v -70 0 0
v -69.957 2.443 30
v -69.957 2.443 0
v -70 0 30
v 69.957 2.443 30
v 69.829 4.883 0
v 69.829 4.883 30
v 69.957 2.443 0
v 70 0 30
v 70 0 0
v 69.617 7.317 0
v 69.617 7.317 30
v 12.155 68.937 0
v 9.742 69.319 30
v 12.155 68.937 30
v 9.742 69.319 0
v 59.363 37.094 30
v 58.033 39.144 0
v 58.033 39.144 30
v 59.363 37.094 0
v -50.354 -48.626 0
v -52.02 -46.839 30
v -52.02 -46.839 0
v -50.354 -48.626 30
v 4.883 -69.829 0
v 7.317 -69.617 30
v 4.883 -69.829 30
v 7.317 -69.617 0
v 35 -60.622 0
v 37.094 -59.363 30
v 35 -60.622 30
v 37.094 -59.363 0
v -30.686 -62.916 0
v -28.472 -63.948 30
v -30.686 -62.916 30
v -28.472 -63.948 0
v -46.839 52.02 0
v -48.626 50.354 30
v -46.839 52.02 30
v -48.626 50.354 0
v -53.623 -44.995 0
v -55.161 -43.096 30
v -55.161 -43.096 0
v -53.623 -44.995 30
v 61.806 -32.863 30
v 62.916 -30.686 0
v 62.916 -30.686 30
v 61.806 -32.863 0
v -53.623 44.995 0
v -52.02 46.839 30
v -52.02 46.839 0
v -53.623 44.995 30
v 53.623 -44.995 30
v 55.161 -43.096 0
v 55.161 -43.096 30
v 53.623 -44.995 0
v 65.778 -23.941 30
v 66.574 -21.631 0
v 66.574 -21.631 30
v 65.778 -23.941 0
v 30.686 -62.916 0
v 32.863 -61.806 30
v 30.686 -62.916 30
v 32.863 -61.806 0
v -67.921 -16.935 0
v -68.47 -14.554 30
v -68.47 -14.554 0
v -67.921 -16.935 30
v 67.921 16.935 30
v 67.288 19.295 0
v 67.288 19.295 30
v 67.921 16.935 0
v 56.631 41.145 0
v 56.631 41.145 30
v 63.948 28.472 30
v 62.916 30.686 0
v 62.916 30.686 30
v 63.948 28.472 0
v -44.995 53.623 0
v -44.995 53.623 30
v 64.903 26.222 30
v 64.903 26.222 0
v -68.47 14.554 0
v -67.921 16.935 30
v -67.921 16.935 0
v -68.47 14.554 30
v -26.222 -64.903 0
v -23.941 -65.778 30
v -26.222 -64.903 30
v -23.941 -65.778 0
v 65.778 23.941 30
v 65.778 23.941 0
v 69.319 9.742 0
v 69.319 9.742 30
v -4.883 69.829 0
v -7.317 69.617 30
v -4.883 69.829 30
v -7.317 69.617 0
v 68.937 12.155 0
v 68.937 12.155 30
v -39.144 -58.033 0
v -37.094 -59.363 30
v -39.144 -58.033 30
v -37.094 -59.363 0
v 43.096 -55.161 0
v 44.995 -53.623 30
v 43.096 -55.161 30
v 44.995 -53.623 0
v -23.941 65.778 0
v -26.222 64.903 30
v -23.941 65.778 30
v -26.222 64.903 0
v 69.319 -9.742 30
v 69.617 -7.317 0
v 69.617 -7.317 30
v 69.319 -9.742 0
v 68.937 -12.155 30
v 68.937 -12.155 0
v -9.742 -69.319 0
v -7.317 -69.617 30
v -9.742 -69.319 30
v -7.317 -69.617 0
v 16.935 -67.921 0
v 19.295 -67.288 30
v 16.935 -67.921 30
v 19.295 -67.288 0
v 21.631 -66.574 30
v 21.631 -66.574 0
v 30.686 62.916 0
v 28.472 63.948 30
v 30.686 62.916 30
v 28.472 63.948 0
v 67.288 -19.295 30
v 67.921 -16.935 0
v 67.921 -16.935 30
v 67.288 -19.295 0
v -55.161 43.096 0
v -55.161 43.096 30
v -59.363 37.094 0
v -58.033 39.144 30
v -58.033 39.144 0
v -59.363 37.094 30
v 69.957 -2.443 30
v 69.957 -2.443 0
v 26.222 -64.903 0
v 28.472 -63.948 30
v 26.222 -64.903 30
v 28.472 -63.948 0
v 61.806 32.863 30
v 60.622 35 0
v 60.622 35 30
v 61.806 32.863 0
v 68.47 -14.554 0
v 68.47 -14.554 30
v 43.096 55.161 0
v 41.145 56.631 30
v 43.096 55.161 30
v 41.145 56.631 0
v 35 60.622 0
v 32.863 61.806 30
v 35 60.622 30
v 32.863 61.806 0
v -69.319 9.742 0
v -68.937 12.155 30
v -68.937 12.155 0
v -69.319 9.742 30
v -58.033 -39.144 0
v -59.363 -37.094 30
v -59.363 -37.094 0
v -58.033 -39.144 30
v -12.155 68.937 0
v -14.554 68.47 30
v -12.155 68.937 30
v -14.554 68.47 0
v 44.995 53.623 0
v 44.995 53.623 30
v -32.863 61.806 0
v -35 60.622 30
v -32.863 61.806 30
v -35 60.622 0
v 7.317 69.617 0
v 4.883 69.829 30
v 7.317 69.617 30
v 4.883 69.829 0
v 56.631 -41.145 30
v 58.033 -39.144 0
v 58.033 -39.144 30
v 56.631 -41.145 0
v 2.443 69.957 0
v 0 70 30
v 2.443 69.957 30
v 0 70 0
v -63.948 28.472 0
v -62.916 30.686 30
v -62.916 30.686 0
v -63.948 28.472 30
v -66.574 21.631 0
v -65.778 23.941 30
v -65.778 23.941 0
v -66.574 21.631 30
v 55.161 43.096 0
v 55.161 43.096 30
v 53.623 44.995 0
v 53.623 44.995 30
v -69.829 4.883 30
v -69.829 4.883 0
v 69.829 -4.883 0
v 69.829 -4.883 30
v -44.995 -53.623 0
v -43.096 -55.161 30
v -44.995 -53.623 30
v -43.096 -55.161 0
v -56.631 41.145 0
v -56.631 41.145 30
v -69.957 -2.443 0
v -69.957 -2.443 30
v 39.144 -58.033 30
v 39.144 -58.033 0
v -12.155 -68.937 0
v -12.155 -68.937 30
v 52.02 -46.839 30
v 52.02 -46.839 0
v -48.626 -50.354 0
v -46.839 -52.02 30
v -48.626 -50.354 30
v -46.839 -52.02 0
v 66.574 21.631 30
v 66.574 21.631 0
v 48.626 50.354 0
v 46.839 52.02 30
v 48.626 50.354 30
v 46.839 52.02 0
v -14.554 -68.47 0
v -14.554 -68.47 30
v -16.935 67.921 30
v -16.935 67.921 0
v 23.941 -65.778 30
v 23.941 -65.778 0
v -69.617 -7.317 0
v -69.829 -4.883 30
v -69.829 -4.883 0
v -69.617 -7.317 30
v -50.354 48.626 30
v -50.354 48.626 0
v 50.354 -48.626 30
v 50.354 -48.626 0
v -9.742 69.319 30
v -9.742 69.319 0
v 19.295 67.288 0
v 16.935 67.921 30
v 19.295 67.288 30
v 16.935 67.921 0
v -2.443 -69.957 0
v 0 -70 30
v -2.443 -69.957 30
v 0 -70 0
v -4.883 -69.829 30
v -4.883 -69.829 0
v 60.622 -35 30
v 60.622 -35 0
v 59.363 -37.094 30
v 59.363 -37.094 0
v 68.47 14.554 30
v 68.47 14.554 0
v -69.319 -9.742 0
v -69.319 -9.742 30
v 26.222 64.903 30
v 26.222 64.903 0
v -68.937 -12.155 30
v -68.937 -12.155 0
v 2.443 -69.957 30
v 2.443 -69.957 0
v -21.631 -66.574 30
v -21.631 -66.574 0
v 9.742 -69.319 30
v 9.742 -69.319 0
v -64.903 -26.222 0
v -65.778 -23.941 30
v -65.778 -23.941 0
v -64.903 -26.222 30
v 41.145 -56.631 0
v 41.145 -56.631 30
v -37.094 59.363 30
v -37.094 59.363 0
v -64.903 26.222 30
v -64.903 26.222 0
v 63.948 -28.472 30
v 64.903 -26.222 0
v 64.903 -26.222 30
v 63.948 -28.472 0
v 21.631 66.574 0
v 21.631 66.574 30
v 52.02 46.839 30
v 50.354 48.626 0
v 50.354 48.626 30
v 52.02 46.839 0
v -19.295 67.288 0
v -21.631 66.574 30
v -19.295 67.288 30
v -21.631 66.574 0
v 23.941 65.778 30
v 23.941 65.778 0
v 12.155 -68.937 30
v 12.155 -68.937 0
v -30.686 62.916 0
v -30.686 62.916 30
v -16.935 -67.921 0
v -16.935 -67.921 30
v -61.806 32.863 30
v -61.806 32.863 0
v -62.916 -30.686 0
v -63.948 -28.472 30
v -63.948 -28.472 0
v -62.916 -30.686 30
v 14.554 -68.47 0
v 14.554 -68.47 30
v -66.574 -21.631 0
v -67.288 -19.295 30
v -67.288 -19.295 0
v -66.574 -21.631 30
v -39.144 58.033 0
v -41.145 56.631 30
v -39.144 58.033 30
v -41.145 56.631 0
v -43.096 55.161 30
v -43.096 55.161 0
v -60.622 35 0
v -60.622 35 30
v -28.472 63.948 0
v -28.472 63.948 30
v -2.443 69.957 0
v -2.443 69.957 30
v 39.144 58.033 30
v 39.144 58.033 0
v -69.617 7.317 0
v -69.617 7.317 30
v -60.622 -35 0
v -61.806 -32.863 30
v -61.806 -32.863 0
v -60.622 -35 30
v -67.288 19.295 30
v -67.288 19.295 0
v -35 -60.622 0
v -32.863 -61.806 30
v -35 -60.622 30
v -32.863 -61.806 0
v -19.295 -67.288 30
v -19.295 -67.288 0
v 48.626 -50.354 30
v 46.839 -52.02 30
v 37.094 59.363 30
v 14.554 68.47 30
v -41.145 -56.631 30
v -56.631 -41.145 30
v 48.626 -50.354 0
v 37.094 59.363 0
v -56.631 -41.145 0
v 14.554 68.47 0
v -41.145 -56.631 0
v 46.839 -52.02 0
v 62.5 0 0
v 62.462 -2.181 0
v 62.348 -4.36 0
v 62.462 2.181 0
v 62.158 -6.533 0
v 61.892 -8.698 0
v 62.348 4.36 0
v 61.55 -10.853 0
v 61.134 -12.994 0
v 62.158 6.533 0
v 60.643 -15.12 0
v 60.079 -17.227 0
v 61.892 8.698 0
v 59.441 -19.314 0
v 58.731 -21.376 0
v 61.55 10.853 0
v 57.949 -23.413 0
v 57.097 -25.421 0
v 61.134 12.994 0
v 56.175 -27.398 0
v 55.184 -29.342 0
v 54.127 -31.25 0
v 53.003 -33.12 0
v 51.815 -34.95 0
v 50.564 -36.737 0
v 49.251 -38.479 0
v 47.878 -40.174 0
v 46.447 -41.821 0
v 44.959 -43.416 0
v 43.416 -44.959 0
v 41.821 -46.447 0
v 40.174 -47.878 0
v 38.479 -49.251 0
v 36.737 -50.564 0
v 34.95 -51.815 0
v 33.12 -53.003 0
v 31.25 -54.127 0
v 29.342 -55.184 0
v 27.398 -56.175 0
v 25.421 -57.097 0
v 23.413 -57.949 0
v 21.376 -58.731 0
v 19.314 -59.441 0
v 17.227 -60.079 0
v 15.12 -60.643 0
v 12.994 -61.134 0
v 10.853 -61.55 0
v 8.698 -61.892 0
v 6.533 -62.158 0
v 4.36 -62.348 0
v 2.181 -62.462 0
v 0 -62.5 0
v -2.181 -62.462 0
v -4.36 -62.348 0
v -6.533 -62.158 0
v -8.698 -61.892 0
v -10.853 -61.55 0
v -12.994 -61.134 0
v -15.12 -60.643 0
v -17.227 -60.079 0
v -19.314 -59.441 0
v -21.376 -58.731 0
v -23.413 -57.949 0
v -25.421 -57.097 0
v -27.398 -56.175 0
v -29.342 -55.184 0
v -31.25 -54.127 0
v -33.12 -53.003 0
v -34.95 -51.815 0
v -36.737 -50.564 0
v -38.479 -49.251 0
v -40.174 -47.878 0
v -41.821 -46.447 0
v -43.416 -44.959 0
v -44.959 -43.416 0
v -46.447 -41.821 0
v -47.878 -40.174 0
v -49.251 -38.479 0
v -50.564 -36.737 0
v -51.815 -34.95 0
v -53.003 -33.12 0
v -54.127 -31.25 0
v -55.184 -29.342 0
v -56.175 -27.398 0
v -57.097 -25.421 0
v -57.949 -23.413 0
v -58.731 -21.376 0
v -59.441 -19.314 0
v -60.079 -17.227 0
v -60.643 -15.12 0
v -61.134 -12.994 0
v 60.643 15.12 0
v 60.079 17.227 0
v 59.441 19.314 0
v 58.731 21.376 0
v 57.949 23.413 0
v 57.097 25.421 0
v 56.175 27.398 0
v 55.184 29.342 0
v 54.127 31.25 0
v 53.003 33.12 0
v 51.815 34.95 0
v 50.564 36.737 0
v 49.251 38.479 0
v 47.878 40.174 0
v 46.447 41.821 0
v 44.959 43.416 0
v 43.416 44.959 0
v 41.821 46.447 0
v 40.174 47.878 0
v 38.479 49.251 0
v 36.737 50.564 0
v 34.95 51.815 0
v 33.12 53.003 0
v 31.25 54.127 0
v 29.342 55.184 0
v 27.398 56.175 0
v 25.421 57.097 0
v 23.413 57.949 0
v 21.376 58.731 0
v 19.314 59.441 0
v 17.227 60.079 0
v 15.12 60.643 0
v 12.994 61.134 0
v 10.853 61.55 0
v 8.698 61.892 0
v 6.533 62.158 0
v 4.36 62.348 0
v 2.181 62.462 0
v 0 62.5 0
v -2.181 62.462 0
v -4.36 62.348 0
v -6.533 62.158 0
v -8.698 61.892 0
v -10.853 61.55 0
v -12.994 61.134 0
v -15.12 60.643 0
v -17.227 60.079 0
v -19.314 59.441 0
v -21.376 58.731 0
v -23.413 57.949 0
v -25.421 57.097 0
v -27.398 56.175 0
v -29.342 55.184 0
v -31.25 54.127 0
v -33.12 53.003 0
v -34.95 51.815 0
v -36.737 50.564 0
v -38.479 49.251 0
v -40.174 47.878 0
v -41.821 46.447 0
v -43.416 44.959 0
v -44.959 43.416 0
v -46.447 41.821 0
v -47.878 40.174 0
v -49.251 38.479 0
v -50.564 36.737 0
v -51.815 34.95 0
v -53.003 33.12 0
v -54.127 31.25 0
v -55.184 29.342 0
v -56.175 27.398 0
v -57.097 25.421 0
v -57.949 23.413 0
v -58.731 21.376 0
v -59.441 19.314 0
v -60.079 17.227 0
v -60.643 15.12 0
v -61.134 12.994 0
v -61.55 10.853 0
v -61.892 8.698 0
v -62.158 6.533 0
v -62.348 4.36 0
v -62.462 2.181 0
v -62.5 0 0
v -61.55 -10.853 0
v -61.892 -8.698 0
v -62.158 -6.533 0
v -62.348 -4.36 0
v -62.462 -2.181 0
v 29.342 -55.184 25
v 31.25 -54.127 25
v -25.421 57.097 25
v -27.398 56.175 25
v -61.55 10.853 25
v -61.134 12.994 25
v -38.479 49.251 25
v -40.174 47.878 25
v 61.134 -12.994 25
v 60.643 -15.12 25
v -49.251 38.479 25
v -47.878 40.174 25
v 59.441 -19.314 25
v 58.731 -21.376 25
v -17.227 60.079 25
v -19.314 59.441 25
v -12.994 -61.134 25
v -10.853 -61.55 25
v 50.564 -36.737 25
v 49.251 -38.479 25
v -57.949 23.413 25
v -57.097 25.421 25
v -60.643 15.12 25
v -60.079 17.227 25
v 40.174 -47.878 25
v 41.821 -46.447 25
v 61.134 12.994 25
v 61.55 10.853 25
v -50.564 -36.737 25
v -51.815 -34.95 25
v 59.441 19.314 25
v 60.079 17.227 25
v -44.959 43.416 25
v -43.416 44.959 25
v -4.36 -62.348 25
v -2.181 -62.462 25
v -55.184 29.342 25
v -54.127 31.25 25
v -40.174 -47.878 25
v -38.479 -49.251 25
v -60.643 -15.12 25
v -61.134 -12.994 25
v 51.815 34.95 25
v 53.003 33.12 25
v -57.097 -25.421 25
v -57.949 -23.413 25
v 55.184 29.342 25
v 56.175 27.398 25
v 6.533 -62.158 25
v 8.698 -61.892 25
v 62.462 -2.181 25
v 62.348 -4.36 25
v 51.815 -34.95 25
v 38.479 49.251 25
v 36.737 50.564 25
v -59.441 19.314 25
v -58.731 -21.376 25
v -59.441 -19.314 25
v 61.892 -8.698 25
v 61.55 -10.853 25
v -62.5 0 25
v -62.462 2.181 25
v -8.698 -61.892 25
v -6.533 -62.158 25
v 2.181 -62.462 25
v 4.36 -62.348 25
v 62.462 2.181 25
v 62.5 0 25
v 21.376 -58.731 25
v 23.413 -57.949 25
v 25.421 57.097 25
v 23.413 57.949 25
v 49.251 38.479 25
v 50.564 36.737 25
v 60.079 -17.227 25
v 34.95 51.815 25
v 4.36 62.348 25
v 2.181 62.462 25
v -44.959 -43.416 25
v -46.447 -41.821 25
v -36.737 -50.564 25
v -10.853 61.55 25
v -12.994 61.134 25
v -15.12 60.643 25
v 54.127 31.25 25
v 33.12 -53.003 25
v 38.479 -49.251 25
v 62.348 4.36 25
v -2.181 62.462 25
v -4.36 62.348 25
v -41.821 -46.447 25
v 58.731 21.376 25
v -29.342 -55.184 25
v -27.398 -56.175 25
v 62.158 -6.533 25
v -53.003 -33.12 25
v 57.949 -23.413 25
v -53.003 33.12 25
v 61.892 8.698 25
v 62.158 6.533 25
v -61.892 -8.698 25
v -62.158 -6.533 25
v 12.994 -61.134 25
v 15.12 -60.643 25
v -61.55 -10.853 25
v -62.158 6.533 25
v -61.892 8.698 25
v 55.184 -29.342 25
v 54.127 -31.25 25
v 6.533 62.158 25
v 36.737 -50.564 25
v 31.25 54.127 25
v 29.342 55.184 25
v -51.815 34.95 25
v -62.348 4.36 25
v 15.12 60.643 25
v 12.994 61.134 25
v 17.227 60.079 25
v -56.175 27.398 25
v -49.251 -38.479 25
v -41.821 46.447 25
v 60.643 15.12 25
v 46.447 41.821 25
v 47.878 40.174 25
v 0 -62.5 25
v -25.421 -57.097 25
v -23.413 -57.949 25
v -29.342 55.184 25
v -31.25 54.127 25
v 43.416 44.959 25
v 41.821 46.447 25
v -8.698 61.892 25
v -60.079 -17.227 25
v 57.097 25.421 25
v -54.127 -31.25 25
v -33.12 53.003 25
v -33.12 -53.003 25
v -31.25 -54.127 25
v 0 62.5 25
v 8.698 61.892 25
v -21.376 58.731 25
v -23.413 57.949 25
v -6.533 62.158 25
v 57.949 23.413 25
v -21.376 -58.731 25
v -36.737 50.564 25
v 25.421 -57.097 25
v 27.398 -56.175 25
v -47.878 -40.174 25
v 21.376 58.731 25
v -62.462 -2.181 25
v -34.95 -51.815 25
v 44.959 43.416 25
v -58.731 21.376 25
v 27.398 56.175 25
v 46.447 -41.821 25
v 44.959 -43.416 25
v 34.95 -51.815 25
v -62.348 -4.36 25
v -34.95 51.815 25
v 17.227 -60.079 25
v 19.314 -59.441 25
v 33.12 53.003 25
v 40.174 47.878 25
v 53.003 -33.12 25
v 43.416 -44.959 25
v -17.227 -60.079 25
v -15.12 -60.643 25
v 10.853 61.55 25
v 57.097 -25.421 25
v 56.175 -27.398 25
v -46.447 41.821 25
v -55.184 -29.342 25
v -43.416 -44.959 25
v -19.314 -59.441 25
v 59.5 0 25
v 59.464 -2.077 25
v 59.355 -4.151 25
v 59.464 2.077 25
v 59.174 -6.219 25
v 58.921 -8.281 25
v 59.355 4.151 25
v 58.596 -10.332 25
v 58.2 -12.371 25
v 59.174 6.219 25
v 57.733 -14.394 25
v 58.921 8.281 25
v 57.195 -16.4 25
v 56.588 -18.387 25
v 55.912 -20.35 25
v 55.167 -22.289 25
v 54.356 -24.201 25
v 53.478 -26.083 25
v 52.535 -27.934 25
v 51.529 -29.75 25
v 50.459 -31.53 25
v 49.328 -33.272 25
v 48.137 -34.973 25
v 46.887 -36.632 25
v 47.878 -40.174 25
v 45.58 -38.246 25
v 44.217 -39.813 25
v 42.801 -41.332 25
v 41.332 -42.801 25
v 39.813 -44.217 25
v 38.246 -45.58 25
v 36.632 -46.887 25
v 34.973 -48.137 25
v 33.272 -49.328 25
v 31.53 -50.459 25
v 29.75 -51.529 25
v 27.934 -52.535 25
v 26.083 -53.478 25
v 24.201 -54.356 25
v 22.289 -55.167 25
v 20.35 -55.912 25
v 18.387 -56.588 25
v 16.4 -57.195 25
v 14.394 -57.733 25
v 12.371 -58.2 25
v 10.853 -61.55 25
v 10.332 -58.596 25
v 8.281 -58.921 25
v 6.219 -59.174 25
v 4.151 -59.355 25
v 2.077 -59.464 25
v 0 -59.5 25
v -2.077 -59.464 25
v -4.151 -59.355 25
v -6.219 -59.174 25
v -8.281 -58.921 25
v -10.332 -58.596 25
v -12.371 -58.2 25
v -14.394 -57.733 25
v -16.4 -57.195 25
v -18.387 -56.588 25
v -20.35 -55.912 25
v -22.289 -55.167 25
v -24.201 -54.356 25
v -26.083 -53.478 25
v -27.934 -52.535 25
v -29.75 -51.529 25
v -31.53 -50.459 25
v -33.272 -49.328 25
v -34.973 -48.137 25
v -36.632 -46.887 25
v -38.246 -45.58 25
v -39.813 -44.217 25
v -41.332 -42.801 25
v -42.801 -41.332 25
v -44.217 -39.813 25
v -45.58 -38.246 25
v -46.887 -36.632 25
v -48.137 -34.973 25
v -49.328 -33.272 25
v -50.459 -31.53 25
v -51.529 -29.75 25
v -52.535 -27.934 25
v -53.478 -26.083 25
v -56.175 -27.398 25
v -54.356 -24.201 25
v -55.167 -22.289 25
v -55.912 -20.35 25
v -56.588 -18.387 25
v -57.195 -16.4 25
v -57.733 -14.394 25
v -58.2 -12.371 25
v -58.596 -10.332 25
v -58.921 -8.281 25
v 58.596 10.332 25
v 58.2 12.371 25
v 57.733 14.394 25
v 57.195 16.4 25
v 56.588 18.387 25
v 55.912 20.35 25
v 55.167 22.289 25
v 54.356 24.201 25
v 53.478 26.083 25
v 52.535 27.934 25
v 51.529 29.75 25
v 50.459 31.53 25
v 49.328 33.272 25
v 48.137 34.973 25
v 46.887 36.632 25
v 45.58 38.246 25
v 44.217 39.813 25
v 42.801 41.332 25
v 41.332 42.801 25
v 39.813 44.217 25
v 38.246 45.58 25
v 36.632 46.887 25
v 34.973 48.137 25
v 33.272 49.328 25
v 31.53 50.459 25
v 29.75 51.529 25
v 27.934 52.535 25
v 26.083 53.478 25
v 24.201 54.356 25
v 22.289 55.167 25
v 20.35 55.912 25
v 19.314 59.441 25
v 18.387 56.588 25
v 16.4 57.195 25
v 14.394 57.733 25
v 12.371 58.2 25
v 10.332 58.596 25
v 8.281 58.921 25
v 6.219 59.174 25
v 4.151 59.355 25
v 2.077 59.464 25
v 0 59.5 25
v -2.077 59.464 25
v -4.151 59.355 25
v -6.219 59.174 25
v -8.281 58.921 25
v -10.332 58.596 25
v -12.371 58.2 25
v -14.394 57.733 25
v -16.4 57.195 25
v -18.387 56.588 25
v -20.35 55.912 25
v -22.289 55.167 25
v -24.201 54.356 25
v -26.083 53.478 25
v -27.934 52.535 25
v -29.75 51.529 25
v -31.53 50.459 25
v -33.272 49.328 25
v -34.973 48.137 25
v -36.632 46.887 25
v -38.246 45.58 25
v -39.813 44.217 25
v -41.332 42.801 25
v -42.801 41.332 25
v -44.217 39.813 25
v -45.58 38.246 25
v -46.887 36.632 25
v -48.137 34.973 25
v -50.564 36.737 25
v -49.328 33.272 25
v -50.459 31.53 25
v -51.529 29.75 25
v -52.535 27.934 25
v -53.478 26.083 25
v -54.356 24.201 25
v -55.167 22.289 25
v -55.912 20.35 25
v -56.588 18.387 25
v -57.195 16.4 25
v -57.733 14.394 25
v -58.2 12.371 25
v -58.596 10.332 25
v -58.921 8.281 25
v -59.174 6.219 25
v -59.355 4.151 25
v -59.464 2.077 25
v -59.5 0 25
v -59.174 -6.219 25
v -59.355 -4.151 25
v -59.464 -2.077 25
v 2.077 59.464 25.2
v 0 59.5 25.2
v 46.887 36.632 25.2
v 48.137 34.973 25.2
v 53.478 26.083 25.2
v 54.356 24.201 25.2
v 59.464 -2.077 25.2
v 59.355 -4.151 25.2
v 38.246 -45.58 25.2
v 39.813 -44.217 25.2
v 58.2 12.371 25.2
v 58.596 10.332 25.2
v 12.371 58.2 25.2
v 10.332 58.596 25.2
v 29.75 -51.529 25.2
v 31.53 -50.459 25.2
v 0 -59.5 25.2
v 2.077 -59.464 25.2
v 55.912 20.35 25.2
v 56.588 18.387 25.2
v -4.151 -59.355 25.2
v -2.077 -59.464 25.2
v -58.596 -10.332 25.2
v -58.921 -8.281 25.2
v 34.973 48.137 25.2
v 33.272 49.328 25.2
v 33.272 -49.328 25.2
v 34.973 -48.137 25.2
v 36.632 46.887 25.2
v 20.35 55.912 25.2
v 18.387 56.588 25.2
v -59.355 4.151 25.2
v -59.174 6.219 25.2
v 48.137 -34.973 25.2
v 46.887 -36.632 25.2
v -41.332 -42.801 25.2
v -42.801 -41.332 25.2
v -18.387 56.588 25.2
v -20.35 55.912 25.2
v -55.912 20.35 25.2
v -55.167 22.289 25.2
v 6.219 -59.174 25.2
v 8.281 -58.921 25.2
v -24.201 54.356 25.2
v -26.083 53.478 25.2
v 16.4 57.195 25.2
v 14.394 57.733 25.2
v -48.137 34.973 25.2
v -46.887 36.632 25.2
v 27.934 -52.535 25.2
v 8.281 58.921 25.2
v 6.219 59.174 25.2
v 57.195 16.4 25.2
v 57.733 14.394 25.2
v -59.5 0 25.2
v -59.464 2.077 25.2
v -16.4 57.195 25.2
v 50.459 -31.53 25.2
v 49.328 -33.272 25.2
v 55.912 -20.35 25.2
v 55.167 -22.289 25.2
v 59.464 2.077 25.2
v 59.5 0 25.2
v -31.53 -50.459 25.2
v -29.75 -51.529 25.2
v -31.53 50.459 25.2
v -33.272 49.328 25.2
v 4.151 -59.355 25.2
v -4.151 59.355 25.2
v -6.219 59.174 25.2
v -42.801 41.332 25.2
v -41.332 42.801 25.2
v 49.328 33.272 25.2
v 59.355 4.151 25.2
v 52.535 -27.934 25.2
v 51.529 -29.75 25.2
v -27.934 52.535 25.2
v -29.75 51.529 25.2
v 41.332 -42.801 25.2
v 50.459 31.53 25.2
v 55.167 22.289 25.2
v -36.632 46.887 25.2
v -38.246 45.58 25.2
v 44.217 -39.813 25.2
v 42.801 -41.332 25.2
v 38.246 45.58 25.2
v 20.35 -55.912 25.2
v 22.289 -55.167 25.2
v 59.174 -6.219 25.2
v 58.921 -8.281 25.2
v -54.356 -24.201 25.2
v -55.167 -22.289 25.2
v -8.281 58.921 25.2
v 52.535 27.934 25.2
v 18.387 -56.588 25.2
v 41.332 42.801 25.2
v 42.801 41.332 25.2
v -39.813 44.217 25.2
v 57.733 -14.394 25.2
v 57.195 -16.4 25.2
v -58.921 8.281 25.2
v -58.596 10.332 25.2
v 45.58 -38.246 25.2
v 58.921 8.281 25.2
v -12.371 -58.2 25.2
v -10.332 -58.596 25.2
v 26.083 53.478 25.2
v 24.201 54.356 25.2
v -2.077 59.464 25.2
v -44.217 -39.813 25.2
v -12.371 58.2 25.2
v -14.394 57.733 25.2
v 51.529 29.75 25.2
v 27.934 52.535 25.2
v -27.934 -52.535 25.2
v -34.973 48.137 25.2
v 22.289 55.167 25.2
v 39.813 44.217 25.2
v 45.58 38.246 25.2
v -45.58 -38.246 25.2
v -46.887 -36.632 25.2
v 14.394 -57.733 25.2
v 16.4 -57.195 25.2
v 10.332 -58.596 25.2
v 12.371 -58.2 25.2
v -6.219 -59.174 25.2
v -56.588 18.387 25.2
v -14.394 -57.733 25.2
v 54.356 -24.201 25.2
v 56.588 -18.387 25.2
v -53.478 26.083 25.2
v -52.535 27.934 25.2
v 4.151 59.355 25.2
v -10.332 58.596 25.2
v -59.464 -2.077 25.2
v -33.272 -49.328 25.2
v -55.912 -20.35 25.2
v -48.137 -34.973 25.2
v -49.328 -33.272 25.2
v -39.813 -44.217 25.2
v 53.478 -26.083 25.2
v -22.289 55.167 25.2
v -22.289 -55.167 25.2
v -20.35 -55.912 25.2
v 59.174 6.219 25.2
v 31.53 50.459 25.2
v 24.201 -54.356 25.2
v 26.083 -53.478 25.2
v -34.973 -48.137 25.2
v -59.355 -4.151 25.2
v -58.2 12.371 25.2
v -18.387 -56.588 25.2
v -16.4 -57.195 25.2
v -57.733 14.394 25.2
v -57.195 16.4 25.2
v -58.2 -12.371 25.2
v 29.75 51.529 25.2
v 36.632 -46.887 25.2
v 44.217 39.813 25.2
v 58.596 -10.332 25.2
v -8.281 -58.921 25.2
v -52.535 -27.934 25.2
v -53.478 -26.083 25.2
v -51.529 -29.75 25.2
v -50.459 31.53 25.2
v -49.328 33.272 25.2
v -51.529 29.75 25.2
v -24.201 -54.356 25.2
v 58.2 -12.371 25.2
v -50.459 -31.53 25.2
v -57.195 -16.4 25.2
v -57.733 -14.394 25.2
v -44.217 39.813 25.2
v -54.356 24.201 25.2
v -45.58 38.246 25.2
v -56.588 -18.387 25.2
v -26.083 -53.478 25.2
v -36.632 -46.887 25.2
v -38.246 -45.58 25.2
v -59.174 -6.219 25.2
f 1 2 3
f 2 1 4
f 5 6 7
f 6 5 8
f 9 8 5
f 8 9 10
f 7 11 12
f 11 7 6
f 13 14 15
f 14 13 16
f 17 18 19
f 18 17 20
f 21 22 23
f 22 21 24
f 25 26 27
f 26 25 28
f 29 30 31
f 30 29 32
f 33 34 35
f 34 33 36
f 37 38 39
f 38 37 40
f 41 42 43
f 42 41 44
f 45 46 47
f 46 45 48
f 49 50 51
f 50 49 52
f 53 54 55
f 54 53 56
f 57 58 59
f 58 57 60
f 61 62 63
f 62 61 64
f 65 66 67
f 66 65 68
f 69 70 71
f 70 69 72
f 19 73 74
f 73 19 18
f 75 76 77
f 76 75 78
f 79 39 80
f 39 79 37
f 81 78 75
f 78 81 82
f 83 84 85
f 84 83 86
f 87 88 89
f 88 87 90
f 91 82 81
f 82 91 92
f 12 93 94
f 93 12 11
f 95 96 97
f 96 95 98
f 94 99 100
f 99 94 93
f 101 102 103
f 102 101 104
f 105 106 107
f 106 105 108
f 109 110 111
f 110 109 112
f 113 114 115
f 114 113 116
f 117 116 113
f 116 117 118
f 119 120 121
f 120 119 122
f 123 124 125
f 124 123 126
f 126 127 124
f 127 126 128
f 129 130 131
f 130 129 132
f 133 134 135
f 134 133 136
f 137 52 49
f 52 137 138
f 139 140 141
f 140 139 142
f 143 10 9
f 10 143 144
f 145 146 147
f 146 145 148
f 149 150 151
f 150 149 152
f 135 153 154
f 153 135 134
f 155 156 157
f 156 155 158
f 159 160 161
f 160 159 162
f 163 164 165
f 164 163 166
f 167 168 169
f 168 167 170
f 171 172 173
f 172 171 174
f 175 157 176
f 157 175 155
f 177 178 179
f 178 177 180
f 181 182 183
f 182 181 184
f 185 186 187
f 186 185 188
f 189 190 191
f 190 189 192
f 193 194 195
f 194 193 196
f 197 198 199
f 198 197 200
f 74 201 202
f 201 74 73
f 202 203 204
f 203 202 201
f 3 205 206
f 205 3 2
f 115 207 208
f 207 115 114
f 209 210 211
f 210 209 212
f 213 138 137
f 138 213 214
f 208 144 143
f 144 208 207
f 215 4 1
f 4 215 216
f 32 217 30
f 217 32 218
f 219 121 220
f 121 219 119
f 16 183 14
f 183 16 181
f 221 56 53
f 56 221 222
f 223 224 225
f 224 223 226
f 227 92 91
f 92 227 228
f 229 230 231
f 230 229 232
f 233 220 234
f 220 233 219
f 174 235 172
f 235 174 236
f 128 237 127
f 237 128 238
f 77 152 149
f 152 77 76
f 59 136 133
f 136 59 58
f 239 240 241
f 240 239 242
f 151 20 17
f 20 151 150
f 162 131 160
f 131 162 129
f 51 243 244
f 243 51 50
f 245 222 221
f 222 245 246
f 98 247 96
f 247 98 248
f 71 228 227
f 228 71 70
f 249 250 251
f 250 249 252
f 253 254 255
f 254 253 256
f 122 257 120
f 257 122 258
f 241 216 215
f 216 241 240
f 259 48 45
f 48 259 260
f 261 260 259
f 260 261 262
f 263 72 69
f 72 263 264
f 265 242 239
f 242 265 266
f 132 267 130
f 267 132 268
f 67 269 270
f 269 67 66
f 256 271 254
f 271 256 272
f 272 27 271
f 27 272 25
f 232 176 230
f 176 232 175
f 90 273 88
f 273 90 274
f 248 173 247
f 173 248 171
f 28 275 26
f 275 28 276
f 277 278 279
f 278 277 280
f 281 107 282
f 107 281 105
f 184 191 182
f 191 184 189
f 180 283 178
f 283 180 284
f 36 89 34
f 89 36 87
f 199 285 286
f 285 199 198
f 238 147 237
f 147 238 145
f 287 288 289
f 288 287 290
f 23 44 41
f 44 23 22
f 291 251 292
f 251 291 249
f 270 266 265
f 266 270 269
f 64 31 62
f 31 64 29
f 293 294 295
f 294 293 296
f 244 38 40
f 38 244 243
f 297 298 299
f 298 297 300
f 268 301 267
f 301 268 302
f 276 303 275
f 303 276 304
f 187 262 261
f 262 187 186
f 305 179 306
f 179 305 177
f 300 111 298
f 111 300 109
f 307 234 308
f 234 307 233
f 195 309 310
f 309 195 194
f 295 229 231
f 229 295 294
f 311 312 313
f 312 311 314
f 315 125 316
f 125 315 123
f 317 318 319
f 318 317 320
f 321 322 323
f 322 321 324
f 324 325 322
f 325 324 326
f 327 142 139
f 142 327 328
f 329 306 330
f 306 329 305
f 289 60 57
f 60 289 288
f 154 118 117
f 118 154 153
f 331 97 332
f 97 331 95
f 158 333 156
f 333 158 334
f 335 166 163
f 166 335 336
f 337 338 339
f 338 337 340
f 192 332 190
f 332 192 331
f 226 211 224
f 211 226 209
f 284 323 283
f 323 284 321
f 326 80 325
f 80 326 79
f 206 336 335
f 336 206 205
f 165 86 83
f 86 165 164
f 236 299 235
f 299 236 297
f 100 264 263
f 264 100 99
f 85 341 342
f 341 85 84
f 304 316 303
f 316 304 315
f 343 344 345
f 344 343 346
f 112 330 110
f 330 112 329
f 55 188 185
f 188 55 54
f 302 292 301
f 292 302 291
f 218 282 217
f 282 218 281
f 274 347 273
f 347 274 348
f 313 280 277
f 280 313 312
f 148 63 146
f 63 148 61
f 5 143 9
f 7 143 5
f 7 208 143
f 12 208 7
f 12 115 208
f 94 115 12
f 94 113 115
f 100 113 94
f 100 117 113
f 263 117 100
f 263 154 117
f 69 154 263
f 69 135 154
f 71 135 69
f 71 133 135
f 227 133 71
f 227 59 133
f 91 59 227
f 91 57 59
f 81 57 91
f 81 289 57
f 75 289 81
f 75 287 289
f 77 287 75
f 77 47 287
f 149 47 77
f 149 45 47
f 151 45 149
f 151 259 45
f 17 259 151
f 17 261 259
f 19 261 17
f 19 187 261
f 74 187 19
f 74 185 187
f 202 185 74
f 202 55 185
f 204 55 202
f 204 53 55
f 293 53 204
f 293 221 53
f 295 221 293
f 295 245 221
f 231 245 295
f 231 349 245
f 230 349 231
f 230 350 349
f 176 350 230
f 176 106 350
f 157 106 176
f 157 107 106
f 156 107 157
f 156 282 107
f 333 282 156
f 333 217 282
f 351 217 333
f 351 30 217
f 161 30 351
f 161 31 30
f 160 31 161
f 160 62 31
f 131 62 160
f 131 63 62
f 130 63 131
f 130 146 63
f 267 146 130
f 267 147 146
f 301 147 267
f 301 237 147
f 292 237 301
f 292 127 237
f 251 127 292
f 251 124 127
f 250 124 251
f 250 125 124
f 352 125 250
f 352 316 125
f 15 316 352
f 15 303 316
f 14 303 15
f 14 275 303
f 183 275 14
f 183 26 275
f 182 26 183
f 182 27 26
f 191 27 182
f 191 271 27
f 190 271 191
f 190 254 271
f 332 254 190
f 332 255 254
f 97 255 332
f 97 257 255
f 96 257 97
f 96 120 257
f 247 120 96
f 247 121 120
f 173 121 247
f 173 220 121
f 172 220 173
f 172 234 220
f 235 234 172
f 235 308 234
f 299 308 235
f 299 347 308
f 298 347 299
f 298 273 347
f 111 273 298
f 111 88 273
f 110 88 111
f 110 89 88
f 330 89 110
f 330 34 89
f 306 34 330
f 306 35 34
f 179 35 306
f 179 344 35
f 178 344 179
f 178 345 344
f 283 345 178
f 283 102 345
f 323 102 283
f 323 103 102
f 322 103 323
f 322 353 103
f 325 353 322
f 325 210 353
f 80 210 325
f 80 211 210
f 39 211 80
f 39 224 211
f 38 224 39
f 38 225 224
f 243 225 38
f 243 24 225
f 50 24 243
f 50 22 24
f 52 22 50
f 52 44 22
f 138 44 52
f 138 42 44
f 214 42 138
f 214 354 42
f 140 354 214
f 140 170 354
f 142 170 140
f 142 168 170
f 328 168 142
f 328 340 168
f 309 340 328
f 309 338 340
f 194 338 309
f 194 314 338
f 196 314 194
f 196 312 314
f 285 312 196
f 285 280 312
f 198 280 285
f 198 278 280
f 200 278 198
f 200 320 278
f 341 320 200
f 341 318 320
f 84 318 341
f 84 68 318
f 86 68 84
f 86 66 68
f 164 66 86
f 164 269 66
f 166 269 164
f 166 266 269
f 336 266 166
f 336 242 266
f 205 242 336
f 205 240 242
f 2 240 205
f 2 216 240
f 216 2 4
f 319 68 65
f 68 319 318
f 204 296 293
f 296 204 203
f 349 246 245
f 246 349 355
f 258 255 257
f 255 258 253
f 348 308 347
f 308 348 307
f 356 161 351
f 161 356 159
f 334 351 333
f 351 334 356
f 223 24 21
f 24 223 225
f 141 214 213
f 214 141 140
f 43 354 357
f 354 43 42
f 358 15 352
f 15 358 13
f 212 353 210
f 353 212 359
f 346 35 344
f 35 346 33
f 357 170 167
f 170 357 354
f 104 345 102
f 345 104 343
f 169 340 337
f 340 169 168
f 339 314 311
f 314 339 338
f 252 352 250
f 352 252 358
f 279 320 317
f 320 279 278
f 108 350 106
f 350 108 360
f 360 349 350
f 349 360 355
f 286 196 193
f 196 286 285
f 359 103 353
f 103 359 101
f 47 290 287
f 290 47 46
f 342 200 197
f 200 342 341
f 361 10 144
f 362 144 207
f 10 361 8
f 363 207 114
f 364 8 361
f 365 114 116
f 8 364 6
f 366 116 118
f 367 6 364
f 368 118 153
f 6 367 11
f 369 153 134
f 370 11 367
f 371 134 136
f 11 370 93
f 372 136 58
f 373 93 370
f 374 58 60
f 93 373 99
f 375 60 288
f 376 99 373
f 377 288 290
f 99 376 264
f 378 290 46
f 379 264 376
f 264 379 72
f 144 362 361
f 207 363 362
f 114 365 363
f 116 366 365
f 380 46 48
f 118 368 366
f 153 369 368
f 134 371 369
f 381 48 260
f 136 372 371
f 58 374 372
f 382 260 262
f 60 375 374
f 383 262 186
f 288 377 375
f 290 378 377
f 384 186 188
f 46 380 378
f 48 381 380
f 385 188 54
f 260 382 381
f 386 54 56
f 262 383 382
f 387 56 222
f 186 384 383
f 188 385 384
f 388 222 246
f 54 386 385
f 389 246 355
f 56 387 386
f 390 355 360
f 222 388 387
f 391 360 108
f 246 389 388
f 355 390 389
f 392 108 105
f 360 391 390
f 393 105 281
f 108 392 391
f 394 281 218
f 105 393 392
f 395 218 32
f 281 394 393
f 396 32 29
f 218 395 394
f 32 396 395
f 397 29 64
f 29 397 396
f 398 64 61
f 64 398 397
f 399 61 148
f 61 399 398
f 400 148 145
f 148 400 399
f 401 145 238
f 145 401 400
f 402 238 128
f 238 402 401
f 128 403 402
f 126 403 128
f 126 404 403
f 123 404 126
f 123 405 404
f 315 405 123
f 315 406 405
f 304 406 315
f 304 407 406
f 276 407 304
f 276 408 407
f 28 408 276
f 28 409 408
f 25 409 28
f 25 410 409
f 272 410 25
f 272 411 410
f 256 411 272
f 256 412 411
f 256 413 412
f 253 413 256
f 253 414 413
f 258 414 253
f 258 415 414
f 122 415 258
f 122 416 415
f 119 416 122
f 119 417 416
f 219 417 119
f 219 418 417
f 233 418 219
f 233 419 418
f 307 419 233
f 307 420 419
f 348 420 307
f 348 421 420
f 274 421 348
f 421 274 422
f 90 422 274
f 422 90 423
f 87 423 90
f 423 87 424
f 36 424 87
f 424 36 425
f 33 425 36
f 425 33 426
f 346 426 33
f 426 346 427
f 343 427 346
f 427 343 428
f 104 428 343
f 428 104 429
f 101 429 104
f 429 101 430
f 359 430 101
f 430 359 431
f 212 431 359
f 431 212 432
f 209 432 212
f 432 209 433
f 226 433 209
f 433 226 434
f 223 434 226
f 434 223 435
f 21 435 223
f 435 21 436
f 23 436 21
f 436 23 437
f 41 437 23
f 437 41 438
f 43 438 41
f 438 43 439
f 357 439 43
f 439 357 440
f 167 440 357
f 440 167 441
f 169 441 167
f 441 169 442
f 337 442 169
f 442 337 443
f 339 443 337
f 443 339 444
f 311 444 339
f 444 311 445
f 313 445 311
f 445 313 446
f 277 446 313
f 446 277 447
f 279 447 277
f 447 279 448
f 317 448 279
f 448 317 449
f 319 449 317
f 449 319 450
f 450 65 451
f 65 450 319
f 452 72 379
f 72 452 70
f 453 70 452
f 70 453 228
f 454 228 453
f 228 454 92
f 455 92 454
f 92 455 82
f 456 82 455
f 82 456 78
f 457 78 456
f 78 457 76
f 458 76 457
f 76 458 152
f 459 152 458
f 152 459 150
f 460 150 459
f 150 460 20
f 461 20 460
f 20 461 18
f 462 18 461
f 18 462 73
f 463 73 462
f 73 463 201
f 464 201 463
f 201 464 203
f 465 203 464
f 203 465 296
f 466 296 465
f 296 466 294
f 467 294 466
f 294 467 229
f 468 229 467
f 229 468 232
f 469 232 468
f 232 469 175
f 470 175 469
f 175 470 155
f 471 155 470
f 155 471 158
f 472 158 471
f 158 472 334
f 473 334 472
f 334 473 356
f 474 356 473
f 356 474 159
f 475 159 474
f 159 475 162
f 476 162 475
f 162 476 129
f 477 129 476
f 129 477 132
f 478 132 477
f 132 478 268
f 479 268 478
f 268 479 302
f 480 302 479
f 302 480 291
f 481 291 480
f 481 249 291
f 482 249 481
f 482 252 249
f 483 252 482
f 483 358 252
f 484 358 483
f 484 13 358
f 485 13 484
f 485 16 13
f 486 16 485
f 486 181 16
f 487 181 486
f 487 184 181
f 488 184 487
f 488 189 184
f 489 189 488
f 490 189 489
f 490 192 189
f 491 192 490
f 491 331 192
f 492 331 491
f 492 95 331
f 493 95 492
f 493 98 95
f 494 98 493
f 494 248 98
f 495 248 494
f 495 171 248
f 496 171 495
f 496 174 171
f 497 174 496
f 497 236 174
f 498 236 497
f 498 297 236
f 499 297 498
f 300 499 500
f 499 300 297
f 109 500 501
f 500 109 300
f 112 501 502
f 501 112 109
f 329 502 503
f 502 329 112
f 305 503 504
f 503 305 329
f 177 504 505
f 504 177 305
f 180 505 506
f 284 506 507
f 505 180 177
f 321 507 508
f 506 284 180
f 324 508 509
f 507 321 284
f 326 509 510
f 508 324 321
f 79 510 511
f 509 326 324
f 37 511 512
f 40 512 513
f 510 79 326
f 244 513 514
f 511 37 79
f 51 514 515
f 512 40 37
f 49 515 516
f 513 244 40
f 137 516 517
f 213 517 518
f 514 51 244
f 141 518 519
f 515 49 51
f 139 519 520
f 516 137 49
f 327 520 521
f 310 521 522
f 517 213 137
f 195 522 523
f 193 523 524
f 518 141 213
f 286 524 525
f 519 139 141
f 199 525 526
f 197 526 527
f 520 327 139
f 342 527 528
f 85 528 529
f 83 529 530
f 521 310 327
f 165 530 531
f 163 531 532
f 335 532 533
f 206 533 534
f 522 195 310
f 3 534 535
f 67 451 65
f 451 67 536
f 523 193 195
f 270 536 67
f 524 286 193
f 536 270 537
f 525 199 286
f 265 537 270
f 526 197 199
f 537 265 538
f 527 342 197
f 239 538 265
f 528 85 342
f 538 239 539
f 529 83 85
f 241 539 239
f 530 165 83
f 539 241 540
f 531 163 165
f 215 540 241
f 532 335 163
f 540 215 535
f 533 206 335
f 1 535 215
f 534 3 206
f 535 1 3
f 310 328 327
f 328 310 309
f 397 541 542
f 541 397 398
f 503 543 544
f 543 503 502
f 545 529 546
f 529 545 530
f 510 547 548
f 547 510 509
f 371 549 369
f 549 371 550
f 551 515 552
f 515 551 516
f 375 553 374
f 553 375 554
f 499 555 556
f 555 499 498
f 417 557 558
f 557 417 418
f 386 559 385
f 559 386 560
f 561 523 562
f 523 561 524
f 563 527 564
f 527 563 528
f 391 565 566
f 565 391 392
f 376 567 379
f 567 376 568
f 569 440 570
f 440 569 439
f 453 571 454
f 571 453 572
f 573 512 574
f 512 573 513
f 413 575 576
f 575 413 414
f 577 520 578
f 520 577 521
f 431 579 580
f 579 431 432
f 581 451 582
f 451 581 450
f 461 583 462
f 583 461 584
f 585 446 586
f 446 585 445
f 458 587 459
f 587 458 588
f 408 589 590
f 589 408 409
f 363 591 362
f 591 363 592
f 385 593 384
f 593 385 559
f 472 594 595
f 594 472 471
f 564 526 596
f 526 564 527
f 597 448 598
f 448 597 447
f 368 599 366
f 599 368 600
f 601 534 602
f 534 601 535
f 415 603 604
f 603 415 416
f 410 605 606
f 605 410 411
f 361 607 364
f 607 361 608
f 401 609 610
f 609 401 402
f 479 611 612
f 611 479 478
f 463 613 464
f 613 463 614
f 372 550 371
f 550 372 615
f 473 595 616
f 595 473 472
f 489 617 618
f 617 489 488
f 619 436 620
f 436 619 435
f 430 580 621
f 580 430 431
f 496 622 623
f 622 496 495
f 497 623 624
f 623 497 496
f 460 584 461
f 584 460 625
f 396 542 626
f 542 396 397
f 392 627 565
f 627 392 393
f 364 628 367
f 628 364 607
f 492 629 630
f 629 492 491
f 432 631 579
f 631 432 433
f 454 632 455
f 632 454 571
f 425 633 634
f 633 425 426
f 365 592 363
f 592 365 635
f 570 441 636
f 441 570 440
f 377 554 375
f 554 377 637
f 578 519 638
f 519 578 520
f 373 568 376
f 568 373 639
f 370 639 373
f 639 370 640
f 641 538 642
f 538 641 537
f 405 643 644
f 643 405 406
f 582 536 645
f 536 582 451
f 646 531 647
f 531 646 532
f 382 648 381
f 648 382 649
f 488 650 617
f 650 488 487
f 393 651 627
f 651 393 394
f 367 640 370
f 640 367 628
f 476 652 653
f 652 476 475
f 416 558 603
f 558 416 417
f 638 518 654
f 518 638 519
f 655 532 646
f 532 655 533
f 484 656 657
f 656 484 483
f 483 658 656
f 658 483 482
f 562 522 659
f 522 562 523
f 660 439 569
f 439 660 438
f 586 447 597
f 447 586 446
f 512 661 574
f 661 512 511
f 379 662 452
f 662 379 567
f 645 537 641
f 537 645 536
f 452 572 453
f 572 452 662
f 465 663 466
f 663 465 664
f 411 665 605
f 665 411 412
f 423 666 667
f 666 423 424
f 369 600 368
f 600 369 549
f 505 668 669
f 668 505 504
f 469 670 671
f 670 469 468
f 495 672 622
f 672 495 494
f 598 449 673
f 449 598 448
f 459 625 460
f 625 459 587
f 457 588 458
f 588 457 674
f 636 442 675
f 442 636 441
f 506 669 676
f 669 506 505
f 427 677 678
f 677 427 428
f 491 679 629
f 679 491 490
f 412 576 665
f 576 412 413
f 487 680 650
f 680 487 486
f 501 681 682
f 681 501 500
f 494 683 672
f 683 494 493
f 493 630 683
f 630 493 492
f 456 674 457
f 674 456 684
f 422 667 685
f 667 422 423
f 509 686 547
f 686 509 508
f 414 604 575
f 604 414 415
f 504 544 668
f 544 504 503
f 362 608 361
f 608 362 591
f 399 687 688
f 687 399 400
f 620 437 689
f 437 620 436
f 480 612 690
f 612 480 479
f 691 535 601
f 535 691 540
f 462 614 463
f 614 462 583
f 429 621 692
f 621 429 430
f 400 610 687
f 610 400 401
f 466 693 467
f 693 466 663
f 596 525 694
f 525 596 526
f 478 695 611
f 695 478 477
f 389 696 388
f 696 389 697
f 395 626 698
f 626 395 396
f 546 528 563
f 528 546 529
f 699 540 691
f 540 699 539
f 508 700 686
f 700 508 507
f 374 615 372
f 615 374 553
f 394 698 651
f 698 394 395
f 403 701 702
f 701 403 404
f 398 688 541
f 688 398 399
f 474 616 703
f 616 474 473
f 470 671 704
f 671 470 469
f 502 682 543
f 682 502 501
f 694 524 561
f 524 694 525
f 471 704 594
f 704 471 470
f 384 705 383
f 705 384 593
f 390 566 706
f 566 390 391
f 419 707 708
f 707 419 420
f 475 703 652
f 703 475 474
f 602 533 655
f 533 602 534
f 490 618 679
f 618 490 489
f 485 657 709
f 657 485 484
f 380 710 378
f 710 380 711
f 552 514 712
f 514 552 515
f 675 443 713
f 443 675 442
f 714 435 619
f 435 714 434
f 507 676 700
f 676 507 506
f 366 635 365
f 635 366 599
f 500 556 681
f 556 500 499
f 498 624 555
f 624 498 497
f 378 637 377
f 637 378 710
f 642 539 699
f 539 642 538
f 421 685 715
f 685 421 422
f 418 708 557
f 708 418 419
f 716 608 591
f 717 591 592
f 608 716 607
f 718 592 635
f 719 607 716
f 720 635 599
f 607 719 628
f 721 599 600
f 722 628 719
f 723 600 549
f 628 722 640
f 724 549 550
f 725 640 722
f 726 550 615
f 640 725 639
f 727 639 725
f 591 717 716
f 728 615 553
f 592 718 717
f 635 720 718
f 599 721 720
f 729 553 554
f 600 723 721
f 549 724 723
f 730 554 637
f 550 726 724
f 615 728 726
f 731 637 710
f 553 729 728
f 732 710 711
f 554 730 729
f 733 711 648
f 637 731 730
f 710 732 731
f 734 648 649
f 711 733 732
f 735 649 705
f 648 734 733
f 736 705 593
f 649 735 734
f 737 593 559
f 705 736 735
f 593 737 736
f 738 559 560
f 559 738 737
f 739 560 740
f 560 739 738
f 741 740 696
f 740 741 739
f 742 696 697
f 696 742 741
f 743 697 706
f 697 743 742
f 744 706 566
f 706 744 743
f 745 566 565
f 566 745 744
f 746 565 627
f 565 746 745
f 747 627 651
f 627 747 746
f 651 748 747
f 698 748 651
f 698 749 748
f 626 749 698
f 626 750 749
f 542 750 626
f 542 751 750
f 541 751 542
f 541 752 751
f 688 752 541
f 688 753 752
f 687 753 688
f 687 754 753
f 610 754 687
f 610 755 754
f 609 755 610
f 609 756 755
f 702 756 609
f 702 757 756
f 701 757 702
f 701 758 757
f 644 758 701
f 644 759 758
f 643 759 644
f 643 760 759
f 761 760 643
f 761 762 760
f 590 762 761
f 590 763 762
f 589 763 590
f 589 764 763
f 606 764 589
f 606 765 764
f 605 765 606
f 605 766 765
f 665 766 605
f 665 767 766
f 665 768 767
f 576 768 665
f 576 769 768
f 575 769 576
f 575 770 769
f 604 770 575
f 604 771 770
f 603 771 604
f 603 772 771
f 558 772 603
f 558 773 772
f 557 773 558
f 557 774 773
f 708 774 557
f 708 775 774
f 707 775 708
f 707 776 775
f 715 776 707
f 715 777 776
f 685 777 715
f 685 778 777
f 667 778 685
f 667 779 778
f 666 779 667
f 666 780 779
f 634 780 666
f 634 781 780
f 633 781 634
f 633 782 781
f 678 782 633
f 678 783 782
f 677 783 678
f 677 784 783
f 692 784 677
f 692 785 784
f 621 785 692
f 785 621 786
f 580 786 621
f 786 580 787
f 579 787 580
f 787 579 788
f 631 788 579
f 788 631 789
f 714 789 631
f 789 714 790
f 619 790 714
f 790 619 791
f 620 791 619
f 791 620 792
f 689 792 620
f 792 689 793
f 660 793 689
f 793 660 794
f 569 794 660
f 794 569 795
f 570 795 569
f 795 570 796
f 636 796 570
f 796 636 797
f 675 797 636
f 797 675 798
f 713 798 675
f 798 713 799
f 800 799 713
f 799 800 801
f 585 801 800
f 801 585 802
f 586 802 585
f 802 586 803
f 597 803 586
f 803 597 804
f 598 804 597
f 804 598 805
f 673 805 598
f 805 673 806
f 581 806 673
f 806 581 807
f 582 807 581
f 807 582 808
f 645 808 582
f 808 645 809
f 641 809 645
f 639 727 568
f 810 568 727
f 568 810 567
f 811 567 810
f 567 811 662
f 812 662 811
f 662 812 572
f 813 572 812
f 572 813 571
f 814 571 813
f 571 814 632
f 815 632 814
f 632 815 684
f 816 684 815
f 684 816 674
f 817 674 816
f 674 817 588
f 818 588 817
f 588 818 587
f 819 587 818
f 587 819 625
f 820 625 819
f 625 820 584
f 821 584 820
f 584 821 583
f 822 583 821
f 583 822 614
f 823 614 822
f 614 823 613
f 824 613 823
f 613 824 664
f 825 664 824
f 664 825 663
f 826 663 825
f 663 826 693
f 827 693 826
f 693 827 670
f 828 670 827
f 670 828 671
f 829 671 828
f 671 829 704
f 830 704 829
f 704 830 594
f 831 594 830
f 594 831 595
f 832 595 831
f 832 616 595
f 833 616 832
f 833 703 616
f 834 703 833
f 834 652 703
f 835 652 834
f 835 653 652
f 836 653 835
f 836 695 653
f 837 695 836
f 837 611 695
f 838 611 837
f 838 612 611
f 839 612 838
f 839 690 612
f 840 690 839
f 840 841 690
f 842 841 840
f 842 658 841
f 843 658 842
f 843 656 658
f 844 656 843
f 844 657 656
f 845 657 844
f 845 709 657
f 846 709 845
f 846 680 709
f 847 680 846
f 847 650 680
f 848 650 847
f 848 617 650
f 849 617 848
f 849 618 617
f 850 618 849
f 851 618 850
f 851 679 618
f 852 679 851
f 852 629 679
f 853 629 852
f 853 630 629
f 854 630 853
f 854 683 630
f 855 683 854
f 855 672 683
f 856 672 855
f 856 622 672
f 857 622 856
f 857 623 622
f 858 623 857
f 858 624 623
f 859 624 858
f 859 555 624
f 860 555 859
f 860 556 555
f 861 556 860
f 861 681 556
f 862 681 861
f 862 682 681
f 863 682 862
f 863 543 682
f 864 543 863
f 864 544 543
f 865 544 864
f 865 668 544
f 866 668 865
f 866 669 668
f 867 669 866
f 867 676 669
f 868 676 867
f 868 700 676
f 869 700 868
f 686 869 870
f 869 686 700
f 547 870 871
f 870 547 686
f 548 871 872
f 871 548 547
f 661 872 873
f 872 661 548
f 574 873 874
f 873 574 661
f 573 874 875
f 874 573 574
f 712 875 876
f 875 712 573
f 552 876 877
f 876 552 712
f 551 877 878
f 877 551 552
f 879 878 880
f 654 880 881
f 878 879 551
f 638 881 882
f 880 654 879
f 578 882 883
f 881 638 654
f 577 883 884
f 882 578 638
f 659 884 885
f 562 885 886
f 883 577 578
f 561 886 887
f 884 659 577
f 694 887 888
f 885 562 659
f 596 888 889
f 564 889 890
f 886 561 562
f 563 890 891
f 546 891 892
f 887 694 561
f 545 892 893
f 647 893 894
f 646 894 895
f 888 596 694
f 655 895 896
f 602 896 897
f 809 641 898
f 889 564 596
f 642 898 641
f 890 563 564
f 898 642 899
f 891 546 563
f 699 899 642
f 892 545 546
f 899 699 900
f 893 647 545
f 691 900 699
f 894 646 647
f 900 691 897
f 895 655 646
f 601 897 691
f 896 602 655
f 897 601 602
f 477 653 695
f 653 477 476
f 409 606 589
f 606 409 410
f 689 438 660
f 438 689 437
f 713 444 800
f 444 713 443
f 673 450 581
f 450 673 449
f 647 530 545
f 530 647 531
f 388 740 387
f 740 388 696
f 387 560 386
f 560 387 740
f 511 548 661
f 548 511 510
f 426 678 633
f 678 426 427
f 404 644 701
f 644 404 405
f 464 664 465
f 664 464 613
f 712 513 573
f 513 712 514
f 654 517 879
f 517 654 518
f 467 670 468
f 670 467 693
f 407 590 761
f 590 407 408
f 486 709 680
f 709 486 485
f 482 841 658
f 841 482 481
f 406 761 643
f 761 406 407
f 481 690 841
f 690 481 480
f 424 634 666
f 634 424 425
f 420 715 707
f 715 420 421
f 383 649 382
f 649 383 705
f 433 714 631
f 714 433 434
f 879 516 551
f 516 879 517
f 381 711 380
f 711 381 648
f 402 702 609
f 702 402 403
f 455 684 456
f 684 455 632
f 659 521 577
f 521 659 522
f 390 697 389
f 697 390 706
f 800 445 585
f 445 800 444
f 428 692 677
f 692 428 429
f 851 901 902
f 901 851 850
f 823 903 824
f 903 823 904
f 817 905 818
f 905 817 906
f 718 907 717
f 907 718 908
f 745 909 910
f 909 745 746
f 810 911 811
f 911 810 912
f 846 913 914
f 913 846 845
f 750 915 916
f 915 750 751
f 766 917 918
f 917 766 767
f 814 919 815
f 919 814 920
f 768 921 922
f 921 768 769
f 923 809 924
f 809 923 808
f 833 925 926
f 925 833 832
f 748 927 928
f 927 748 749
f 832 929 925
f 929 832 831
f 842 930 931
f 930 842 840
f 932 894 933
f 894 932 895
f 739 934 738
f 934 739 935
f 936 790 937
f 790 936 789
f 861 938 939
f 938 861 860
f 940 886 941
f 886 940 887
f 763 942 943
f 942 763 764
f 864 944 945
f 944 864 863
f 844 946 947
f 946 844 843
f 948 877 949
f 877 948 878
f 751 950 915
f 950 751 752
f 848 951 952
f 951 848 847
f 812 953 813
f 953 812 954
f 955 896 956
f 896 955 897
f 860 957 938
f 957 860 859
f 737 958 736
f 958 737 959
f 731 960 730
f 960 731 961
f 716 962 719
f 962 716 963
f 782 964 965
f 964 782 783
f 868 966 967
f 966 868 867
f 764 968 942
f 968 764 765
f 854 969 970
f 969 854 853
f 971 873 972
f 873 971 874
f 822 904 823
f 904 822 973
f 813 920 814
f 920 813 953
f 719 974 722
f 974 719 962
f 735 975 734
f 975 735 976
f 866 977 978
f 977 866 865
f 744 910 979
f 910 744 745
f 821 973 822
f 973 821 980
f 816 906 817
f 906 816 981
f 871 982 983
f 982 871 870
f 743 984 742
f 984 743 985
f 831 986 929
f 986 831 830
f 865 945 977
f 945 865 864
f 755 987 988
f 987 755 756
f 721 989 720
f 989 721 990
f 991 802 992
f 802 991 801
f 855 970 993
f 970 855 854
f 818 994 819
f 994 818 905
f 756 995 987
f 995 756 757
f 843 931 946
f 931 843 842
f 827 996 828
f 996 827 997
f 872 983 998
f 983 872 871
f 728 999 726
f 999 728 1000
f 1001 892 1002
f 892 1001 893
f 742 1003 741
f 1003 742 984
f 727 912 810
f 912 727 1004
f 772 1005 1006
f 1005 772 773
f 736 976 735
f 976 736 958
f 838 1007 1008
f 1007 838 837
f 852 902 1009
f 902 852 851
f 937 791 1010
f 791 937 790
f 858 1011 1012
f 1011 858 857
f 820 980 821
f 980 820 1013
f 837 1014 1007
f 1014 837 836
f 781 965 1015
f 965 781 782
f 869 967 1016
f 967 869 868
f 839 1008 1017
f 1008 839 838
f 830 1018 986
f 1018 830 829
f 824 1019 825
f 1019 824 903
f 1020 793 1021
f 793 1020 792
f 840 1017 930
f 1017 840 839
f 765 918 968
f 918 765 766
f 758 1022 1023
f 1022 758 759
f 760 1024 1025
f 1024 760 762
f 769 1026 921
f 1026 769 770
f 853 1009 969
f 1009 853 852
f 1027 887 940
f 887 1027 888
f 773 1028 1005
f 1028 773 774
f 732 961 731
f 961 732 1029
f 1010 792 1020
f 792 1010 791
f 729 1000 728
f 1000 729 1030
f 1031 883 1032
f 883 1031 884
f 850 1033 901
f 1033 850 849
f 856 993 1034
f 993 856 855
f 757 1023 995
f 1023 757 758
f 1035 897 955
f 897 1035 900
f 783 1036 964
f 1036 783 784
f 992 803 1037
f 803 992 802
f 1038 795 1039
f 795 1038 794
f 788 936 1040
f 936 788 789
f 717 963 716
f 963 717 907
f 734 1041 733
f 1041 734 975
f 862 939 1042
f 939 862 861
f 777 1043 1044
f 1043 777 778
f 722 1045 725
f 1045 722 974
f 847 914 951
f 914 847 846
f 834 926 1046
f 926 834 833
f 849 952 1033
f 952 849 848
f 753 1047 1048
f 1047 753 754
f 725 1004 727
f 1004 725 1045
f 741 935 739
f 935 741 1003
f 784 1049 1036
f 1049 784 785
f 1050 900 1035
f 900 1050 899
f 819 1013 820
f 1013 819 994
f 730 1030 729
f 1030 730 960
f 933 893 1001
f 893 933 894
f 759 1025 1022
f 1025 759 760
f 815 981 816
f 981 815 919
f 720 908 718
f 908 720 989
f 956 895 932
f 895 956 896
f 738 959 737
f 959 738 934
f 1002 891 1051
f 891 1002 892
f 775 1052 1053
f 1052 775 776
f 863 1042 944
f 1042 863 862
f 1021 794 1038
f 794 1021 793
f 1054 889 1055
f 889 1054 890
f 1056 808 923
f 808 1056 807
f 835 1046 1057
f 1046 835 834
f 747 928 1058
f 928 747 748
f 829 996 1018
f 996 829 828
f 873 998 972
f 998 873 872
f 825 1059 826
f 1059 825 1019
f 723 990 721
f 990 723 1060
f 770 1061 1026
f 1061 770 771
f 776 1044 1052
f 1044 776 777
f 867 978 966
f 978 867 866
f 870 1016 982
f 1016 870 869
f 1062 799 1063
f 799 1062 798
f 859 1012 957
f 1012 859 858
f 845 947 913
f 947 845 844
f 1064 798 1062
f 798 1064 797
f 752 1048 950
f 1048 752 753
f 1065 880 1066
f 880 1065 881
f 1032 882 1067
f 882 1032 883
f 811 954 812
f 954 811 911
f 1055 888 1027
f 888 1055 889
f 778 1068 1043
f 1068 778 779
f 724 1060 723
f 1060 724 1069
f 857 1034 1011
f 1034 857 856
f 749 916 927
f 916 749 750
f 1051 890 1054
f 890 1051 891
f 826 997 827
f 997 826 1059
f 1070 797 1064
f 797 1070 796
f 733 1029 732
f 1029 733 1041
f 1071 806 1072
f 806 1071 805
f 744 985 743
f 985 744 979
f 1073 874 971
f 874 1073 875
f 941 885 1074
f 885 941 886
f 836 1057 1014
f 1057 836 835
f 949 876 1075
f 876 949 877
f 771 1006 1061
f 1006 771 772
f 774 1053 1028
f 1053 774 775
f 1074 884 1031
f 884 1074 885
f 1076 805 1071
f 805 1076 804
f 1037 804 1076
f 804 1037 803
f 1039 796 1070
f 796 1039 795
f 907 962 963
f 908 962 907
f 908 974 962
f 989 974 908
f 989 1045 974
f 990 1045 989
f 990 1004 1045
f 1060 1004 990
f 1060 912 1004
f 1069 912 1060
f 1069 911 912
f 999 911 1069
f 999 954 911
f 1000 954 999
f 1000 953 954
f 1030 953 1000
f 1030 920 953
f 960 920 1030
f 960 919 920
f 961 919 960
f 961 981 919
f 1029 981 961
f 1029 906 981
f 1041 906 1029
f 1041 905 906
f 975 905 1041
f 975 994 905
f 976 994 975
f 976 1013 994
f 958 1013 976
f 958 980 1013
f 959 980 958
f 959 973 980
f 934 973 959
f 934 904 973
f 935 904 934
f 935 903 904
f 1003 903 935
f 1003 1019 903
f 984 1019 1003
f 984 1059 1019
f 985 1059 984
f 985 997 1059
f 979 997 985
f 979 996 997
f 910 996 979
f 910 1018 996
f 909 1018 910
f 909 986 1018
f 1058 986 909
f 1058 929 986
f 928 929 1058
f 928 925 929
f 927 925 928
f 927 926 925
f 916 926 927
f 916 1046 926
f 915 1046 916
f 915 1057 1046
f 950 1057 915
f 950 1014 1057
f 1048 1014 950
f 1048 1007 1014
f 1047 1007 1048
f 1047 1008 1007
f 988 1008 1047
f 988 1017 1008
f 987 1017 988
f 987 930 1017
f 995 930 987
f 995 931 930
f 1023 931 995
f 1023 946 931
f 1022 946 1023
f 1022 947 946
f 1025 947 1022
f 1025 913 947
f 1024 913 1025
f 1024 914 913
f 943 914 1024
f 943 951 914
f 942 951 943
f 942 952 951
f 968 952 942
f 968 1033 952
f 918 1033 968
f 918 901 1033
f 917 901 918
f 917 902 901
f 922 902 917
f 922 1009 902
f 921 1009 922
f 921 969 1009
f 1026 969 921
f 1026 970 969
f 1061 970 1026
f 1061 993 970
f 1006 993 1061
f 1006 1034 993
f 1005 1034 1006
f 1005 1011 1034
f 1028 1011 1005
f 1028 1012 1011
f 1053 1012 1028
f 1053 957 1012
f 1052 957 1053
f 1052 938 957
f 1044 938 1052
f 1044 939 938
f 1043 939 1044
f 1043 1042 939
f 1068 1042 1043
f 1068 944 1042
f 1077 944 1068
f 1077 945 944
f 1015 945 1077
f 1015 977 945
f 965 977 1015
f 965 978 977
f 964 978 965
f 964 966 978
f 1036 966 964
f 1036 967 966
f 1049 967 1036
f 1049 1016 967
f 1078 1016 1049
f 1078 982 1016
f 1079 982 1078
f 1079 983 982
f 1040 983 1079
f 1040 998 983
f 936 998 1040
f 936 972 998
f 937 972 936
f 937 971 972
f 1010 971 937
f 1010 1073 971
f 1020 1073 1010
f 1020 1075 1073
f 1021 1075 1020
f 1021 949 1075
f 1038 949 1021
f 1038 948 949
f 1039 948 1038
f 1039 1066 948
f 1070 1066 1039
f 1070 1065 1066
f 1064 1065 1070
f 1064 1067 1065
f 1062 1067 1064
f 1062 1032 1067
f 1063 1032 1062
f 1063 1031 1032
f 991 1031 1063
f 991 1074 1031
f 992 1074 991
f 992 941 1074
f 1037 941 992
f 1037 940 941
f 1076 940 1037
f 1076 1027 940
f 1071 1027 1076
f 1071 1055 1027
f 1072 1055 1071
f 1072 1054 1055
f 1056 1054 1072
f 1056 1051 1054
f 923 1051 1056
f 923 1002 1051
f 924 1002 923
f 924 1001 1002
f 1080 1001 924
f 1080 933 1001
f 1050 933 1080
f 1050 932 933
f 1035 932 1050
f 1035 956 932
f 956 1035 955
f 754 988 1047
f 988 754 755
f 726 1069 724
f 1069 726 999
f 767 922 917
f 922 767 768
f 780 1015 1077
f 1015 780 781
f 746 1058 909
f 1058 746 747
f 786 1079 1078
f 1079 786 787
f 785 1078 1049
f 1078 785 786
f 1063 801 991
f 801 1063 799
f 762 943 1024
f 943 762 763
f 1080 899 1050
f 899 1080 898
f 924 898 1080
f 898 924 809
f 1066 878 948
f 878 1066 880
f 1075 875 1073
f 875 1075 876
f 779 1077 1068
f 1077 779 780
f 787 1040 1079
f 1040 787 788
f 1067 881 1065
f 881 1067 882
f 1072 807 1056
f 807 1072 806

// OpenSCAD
$fn = 180;

// Parameters for HT 125 cap
cap_outer_diameter = 140;            // outer diameter
cap_inner_diameter = 125;            // socket ID
cap_height = 30;                     // total height
end_wall_thickness = 5;              // closed end thickness
internal_stop_shoulder_thickness = 3; // axial thickness of internal stop ring

// Small overlap to guarantee robust booleans
eps = 0.2;

module ht_125_cap() {
    // Derived dimensions
    inner_void_h = max(0, cap_height - end_wall_thickness); // depth of inner cavity from open end
    stop_h = min(internal_stop_shoulder_thickness, inner_void_h);

    // Stop ring reduces the ID by 2*radial_reduction
    radial_reduction = internal_stop_shoulder_thickness;
    stop_d = max(0.01, cap_inner_diameter - 2*radial_reduction);

    // Place stop ring at the bottom of the cavity (just above the end wall)
    stop_z = max(0, inner_void_h - stop_h);

    difference() {
        // Outer solid
        cylinder(h=cap_height, d=cap_outer_diameter, center=false);

        // Main inner cavity (open end at z=0)
        translate([0, 0, -eps])
            cylinder(h=inner_void_h + eps, d=cap_inner_diameter, center=false);

        // Internal stop shoulder: subtract a smaller cylinder only in the stop region,
        // leaving an annular ring that blocks the pipe.
        translate([0, 0, stop_z - eps])
            cylinder(h=stop_h + 2*eps, d=stop_d, center=false);
    }
}

ht_125_cap();
